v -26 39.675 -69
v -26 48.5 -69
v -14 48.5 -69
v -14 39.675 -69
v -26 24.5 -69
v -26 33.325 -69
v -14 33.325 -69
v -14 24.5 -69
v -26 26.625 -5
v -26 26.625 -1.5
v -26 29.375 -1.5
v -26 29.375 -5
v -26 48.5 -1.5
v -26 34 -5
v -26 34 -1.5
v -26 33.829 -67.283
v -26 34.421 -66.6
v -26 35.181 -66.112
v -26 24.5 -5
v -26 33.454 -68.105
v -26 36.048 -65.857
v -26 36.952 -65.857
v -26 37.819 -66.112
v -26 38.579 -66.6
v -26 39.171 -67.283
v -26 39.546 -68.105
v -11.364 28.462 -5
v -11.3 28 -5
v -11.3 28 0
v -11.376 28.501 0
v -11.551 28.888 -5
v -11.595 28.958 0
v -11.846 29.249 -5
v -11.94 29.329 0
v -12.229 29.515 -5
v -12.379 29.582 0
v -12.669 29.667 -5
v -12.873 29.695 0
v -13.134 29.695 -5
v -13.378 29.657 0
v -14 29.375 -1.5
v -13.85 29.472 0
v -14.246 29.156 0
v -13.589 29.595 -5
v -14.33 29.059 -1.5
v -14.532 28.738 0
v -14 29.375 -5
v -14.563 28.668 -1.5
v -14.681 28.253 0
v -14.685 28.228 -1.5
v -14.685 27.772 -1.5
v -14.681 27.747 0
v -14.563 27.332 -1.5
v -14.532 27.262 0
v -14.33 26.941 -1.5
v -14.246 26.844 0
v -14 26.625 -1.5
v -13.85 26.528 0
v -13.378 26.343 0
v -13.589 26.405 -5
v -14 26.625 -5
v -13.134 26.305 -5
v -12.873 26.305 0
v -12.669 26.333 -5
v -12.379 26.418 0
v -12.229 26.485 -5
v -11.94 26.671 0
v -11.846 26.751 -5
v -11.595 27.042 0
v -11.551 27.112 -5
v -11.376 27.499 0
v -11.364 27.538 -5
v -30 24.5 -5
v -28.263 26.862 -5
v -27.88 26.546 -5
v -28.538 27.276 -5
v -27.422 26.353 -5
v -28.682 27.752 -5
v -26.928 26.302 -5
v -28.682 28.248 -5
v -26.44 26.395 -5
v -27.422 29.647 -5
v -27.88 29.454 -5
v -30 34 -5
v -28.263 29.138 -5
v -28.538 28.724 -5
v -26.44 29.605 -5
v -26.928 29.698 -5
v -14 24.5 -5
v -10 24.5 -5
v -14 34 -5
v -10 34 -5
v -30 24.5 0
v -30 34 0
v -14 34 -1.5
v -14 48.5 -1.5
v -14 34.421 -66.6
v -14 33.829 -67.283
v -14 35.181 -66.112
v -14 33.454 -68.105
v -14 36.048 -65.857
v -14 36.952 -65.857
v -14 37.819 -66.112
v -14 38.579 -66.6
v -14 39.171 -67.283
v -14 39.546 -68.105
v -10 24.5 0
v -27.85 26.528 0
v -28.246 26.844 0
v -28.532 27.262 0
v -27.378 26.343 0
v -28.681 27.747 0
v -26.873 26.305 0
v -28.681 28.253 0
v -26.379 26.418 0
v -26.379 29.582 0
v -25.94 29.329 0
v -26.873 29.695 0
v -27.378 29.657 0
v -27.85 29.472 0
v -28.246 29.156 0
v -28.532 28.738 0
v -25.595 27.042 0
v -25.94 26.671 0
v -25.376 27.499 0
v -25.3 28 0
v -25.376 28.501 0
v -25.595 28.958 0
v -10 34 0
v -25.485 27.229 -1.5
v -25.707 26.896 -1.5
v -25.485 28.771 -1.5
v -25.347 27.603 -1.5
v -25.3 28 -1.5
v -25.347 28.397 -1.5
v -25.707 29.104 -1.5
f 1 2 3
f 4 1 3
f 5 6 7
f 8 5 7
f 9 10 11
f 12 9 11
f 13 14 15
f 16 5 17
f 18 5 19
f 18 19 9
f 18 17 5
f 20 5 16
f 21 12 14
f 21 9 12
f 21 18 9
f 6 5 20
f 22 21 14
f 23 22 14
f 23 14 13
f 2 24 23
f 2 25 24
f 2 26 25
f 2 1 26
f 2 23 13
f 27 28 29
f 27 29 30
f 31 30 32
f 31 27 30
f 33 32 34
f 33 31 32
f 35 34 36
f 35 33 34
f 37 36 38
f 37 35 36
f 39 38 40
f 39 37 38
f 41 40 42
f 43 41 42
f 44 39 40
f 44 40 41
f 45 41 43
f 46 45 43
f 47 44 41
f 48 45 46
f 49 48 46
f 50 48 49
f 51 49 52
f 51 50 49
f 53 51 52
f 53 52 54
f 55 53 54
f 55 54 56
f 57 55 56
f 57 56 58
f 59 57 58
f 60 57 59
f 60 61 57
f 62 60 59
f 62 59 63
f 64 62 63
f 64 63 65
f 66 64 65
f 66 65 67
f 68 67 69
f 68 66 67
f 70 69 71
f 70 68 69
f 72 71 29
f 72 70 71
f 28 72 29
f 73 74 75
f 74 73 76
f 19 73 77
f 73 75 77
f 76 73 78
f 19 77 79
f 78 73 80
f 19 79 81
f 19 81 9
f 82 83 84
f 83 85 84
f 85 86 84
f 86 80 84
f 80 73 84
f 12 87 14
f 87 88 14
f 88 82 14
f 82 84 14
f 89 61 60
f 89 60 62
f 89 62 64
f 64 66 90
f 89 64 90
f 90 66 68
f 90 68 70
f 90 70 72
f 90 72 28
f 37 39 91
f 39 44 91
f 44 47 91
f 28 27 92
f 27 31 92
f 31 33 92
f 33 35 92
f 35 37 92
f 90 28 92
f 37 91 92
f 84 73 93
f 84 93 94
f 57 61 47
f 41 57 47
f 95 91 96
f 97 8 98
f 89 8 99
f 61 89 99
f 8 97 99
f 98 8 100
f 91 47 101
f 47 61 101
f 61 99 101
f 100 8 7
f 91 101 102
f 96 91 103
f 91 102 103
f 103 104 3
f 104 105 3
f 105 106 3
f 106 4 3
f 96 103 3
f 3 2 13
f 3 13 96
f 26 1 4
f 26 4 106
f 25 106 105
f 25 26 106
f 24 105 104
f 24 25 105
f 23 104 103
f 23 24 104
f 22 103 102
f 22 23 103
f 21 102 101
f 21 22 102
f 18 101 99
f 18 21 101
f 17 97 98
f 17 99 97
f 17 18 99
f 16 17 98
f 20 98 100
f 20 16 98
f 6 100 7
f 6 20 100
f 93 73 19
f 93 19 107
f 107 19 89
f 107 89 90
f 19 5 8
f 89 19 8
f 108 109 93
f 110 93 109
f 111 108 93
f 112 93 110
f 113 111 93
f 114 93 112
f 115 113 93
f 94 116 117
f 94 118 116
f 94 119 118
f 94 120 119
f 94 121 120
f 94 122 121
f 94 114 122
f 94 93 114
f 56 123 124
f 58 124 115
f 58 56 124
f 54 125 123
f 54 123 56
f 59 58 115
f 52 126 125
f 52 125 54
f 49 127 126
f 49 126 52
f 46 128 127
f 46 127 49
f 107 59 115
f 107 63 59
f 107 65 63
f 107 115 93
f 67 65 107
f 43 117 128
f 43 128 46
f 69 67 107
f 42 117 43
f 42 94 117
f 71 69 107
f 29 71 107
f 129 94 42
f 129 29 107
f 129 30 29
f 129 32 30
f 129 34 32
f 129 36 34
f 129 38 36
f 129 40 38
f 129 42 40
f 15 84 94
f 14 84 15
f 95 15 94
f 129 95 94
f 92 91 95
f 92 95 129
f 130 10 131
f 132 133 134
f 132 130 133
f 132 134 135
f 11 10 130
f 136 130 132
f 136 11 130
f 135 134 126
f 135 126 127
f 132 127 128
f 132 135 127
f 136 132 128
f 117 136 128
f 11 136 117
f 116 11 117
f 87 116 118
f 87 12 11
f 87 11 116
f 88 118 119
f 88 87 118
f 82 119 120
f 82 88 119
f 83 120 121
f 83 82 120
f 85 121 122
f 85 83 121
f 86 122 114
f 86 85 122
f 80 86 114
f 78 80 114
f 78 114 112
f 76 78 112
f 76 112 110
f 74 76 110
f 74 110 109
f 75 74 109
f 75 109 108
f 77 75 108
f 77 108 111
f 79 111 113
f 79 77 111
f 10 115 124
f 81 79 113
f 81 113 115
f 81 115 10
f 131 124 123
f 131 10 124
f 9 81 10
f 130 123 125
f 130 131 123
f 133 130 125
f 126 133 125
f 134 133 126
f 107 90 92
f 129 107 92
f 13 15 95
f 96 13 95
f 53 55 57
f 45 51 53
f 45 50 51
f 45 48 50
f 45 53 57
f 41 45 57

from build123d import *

# Parameters (mm, degrees)
FIVE_MM_ATTACHMENT_FOOT_START                    = -5
SKETCH1_W                                        = 20
SKETCH1_H                                        = 9.5
SKETCH1_R                                        = 1.7
FIVE_MM_ATTACHMENT_FOOT_DEPTH                    = 5
DEEP_ACTUATOR_WEB_START                          = -69
SKETCH2_W                                        = 12
SKETCH2_H                                        = 24
DEEP_ACTUATOR_WEB_DEPTH                          = 67.5
QUARTER20_AXIAL_THREAD_MAJOR_ENVELOPE_DEPTH      = 90.516758208
QUARTER20_AXIAL_THREAD_MAJOR_ENVELOPE_DEPTH_BACK = 90.516758208
SKETCH3_R                                        = 3.175


with BuildPart() as part:
    # Sketch1 → Five_mm_Attachment_Foot (new body)
    with BuildSketch(Plane.XY.offset(FIVE_MM_ATTACHMENT_FOOT_START)):
        with Locations((-20, 29.25)):
            Rectangle(SKETCH1_W, SKETCH1_H)
        with Locations((-27, 28)):
            Circle(SKETCH1_R, mode=Mode.SUBTRACT)
        with Locations((-13, 28)):
            Circle(SKETCH1_R, mode=Mode.SUBTRACT)
    extrude(amount=FIVE_MM_ATTACHMENT_FOOT_DEPTH)

    # Sketch2 → Deep_Actuator_Web (add)
    with BuildSketch(Plane.XY.offset(DEEP_ACTUATOR_WEB_START)):
        with Locations((-20, 36.5)):
            Rectangle(SKETCH2_W, SKETCH2_H)
    extrude(amount=DEEP_ACTUATOR_WEB_DEPTH)

    # Sketch3 → Quarter20_Axial_Thread_Major_Envelope (cut, two sides: drawn at the far end of the back side and taken through both)
    with BuildSketch(Plane(origin=(0, 0, 0), x_dir=(0, 0, -1), z_dir=(1, 0, 0)).offset(-QUARTER20_AXIAL_THREAD_MAJOR_ENVELOPE_DEPTH_BACK)):
        with Locations((69, 36.5)):
            Circle(SKETCH3_R)
    extrude(amount=QUARTER20_AXIAL_THREAD_MAJOR_ENVELOPE_DEPTH + QUARTER20_AXIAL_THREAD_MAJOR_ENVELOPE_DEPTH_BACK, mode=Mode.SUBTRACT)


solid = part.part
